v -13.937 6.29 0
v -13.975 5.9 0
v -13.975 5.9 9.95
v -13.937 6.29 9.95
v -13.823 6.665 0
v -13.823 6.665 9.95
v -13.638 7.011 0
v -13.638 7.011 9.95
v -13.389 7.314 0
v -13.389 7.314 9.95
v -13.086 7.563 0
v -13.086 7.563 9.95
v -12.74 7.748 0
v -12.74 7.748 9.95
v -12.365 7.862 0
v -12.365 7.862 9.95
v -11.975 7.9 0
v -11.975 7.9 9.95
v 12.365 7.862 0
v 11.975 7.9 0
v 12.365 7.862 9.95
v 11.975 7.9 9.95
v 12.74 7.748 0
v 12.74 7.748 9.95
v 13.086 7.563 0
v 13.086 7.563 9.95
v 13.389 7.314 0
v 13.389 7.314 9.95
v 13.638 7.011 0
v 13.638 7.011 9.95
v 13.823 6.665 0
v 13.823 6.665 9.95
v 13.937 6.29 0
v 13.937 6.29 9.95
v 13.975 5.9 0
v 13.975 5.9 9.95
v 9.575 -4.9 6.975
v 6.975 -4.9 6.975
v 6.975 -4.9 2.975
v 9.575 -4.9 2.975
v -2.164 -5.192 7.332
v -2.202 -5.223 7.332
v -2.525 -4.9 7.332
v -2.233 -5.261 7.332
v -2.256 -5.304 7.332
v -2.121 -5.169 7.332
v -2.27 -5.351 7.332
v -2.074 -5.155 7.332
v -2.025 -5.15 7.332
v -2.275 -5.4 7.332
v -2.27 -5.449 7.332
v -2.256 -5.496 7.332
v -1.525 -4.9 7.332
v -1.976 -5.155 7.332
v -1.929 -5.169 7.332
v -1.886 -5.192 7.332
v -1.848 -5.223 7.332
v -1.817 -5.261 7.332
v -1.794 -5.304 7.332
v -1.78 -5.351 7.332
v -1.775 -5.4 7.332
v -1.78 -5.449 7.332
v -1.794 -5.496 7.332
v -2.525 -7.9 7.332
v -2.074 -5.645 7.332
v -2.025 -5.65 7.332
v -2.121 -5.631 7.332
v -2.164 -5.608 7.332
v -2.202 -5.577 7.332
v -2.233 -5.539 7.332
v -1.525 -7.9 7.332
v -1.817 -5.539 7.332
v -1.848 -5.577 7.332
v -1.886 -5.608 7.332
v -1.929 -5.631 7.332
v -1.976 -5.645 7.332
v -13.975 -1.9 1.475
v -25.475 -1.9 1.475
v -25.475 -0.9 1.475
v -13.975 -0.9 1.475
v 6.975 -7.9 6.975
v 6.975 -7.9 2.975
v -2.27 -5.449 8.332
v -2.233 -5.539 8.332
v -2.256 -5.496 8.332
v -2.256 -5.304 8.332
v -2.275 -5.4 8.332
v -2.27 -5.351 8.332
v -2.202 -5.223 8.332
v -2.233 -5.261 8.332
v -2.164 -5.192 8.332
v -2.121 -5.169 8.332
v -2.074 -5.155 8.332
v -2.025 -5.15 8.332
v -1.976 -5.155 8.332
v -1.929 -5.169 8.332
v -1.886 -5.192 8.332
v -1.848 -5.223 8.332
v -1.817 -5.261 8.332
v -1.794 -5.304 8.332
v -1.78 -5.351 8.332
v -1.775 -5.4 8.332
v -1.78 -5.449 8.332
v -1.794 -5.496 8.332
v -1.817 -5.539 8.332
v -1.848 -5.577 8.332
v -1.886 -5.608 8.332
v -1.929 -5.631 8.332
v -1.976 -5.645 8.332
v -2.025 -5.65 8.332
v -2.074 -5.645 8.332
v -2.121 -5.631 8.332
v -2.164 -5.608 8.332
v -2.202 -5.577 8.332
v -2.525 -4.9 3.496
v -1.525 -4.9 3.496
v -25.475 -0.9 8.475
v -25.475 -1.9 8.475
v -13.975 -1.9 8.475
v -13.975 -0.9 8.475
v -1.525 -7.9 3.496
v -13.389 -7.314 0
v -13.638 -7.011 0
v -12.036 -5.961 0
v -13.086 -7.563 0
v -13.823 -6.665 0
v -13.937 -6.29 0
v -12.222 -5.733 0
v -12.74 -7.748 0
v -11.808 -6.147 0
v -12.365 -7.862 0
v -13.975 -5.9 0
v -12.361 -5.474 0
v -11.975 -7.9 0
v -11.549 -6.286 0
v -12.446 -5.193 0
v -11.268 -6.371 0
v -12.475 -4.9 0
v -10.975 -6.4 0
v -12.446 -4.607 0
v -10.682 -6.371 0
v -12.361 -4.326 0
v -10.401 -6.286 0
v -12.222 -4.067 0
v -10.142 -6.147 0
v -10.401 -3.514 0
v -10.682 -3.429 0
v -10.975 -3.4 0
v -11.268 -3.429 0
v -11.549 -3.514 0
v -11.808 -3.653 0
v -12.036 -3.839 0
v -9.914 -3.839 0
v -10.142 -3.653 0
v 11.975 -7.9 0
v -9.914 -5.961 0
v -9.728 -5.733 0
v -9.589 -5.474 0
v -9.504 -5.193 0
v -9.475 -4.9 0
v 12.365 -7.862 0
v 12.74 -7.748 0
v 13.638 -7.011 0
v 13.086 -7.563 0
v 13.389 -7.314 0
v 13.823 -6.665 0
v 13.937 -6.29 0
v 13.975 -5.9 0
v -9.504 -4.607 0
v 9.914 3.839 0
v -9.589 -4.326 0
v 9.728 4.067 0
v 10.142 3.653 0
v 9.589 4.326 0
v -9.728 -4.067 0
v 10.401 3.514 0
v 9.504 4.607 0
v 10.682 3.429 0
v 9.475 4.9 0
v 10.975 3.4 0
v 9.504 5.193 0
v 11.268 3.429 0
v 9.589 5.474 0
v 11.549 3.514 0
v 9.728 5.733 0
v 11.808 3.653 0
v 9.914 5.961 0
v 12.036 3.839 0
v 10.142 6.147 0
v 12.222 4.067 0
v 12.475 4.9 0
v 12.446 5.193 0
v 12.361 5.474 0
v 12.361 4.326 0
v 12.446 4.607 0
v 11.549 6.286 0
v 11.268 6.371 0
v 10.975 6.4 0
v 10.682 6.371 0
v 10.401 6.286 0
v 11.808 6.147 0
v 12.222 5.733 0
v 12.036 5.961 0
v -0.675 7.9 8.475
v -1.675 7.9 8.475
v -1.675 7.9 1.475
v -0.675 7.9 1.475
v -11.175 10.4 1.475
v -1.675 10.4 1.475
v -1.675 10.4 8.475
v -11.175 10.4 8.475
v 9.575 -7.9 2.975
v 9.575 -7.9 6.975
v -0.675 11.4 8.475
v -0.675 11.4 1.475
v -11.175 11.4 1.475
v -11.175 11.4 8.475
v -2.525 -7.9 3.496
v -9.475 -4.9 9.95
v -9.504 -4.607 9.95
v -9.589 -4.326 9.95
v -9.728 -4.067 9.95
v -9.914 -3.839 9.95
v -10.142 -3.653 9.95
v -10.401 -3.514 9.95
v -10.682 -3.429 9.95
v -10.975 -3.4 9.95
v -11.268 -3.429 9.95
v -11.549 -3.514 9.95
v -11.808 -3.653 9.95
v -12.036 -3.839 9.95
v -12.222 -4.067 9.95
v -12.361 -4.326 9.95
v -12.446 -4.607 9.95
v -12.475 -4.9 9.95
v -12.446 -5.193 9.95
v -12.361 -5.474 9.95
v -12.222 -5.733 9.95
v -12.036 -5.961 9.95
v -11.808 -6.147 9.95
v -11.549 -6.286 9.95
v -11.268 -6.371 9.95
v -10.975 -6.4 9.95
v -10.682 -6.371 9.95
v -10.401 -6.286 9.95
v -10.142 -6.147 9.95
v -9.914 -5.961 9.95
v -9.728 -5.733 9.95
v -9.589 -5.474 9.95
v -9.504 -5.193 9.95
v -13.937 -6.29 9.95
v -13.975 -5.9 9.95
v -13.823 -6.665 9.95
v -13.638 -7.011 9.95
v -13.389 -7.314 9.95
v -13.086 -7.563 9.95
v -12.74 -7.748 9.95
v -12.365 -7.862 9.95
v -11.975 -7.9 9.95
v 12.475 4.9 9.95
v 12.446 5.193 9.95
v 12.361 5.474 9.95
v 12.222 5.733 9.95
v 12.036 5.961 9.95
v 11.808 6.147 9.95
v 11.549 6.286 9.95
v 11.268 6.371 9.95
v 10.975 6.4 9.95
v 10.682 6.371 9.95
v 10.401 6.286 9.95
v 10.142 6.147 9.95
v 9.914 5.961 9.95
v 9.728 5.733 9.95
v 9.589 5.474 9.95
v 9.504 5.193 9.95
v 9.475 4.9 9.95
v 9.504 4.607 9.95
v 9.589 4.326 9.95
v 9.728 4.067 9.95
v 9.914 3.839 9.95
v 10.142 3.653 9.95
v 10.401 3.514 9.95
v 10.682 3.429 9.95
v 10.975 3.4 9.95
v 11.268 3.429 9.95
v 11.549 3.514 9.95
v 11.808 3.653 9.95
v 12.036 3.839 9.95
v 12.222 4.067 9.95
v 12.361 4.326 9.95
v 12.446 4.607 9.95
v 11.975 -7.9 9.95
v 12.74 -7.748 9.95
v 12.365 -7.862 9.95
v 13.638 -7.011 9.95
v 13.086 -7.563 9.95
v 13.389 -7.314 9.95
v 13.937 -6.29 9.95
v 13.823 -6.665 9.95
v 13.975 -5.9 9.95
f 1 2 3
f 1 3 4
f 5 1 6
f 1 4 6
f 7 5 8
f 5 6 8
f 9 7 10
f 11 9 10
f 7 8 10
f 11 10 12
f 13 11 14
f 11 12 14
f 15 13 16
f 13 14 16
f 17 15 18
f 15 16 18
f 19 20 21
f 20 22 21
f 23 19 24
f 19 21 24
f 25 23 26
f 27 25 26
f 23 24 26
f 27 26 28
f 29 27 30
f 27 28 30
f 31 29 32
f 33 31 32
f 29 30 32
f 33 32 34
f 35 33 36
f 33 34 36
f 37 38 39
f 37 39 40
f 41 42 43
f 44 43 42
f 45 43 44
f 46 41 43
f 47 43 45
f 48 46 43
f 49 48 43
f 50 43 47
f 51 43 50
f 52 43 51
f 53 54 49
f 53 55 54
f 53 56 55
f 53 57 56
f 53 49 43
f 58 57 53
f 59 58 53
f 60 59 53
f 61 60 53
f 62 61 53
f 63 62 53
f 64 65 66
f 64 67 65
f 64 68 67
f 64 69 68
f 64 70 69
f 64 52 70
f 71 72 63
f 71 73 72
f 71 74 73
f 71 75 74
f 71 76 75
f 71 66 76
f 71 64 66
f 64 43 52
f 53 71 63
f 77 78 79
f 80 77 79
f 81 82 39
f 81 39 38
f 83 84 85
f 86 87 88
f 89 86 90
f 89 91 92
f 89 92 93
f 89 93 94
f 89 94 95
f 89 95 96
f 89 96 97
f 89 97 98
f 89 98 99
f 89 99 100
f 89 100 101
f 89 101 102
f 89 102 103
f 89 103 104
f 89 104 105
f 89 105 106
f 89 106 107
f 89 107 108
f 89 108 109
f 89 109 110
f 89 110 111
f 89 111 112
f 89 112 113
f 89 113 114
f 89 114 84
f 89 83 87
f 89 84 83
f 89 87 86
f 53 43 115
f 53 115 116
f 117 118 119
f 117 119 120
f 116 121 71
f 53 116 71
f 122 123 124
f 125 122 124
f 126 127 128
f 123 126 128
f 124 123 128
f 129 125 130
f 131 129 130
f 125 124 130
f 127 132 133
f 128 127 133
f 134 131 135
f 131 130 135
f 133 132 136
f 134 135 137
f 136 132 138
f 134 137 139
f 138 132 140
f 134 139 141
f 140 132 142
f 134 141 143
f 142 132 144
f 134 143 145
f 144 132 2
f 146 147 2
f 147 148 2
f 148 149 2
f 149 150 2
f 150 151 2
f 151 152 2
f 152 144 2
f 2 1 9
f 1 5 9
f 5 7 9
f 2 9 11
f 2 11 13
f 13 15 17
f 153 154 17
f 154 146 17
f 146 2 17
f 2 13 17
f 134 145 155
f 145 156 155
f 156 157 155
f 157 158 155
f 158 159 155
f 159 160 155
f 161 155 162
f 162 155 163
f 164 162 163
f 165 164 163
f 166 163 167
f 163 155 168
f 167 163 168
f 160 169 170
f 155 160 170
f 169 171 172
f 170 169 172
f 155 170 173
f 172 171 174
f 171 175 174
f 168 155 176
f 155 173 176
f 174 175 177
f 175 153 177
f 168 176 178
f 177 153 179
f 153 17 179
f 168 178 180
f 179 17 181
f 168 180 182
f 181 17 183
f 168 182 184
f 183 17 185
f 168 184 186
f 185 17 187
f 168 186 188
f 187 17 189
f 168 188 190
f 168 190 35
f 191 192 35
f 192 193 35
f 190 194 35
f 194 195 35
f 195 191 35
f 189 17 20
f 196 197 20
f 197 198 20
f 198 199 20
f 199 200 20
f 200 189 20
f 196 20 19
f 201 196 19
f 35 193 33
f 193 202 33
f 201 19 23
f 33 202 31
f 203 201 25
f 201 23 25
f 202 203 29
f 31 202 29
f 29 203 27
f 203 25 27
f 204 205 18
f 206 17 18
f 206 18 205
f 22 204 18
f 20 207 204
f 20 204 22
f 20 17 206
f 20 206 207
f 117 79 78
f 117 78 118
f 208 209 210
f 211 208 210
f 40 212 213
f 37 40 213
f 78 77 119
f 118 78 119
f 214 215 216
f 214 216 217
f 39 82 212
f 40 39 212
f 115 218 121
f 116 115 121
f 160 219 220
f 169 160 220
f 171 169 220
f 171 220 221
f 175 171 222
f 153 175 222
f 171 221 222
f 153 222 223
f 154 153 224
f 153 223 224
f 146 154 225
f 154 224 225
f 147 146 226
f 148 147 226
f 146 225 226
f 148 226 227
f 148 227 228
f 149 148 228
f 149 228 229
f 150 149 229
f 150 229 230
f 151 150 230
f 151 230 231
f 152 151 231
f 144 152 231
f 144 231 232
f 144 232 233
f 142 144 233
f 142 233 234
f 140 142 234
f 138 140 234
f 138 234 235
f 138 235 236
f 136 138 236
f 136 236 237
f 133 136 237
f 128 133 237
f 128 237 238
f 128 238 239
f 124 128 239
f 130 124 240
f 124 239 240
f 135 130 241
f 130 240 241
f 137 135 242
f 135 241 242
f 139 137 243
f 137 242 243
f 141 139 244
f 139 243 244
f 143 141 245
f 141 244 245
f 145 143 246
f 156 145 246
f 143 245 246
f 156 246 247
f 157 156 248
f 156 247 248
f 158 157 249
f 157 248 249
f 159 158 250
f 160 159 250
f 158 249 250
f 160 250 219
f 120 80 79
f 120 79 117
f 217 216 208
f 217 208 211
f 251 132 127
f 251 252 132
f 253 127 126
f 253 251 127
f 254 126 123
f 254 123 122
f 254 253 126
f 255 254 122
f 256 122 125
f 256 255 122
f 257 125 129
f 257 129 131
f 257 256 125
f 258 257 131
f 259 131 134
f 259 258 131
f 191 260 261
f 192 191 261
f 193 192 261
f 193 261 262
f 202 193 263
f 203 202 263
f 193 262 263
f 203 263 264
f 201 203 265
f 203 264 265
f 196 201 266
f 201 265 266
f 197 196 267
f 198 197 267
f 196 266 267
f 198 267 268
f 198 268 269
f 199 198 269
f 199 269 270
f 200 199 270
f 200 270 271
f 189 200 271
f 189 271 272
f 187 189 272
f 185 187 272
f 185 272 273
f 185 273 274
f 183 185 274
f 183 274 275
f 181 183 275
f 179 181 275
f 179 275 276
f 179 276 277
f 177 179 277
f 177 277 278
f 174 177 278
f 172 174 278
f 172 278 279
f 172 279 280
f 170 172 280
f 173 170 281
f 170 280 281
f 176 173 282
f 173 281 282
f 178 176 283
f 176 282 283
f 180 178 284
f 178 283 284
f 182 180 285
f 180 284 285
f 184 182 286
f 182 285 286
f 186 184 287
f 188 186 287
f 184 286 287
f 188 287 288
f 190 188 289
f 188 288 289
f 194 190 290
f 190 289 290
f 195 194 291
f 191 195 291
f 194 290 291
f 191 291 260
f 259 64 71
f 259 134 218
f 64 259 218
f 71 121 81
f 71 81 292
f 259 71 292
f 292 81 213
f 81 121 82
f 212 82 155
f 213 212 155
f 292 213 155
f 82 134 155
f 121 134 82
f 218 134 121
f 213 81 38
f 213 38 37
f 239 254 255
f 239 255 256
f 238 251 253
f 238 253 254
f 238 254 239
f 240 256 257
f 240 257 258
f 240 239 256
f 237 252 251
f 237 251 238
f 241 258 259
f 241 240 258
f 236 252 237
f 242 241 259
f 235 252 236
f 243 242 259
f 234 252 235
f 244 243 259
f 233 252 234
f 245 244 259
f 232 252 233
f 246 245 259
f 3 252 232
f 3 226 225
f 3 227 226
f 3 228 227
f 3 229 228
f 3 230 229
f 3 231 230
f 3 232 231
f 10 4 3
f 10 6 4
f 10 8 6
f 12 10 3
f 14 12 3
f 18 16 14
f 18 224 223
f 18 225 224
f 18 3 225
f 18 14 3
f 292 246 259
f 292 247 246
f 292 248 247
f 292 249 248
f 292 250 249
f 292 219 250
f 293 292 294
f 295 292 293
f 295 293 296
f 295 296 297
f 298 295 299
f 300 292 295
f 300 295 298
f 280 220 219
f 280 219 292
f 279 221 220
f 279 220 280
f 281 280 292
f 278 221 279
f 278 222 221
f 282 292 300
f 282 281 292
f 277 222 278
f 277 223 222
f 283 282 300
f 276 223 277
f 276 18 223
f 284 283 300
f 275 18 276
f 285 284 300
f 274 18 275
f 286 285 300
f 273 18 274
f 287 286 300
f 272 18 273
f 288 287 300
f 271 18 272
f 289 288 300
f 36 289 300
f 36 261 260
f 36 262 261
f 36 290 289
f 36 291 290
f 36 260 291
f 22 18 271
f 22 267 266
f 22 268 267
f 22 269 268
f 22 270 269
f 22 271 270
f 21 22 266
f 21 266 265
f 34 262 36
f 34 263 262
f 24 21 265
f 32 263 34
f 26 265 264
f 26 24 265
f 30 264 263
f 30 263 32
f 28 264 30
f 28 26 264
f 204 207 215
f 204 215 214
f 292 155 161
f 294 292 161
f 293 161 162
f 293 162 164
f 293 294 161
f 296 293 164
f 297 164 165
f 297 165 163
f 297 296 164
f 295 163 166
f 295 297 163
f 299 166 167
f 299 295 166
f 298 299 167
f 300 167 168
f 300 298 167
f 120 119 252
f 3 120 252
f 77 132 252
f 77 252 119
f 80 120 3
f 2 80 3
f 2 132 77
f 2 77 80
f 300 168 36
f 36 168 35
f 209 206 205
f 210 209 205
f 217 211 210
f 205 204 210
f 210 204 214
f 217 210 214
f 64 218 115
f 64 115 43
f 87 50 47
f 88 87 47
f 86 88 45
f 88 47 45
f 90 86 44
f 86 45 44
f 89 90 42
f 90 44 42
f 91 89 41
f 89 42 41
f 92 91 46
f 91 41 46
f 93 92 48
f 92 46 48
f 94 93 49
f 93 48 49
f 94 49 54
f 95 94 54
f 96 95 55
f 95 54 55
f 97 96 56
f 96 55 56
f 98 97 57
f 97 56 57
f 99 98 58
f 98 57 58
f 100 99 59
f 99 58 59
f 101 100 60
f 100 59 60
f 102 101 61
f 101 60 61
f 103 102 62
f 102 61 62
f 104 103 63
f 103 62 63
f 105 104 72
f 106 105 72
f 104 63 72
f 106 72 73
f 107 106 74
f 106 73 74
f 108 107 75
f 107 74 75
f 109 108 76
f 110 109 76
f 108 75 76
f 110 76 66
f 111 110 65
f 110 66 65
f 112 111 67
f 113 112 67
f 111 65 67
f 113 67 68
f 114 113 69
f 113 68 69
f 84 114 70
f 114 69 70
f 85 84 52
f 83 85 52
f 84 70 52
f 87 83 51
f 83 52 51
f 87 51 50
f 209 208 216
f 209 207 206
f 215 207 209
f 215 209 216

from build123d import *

# Parameters (mm, degrees)
SKETCH1_W      = 27.95
SKETCH1_H      = 15.8
EXTRUDE1_DEPTH = 9.95
SKETCH2_R      = 1.5
EXTRUDE2_DEPTH = 10.95
FILLET1_R      = 2
SKETCH3_W      = 7
SKETCH3_H      = 1
EXTRUDE3_DEPTH = 11.5
SKETCH4_W      = 1
SKETCH4_H      = 7
EXTRUDE4_DEPTH = 3.5
SKETCH5_W      = 7
SKETCH5_H      = 1
EXTRUDE5_DEPTH = 9.5
SKETCH6_W      = 2.6
SKETCH6_H      = 4
EXTRUDE6_DEPTH = 3
SKETCH7_W      = 1
SKETCH7_H      = 3.836260464
EXTRUDE7_DEPTH = 3
SKETCH8_R      = 0.25
EXTRUDE8_DEPTH = 1


with BuildPart() as part:
    # Sketch1 → Extrude1 (new body)
    with BuildSketch(Plane.XY):
        Rectangle(SKETCH1_W, SKETCH1_H)
    extrude(amount=EXTRUDE1_DEPTH)

    # Sketch2 → Extrude2 (cut, through all)
    with BuildSketch(Plane.XY.offset(9.95)):
        with Locations((10.975, 4.9)):
            Circle(SKETCH2_R)
        with Locations((-10.975, -4.9)):
            Circle(SKETCH2_R)
    extrude(amount=-EXTRUDE2_DEPTH, mode=Mode.SUBTRACT)

    # Fillet1
    fillet1_edges = [part.edges().sort_by_distance(p)[0] for p in [
        (-13.975, 7.9, 4.975),
        (13.975, 7.9, 4.975),
        (13.975, -7.9, 4.975),
        (-13.975, -7.9, 4.975),
    ]]
    fillet(fillet1_edges, radius=FILLET1_R)

    # Sketch3 → Extrude3 (add)
    with BuildSketch(Plane.ZY.offset(13.975)):
        with Locations((4.975, -1.4)):
            Rectangle(SKETCH3_W, SKETCH3_H)
    extrude(amount=EXTRUDE3_DEPTH)

    # Sketch4 → Extrude4 (add)
    with BuildSketch(Plane(origin=(0, 7.9, 0), x_dir=(-1, 0, 0), z_dir=(0, 1, 0))):
        with Locations((1.175, 4.975)):
            Rectangle(SKETCH4_W, SKETCH4_H)
    extrude(amount=EXTRUDE4_DEPTH)

    # Sketch5 → Extrude5 (add)
    with BuildSketch(Plane.ZY.offset(1.675)):
        with Locations((4.975, 10.9)):
            Rectangle(SKETCH5_W, SKETCH5_H)
    extrude(amount=EXTRUDE5_DEPTH)

    # Sketch6 → Extrude6 (cut)
    with BuildSketch(Plane.XZ.offset(7.9)):
        with Locations((8.275, 4.975)):
            Rectangle(SKETCH6_W, SKETCH6_H)
    extrude(amount=-EXTRUDE6_DEPTH, mode=Mode.SUBTRACT)

    # Sketch7 → Extrude7 (cut)
    with BuildSketch(Plane.XZ.offset(7.9)):
        with Locations((-2.025, 5.414128699)):
            Rectangle(SKETCH7_W, SKETCH7_H)
    extrude(amount=-EXTRUDE7_DEPTH, mode=Mode.SUBTRACT)

    # Sketch8 → Extrude8 (cut)
    with BuildSketch(Plane(origin=(0, 0, 7.332258931), x_dir=(-1, 0, 0), z_dir=(0, 0, -1))):
        with Locations((2.025, -5.4)):
            Circle(SKETCH8_R)
    extrude(amount=-EXTRUDE8_DEPTH, mode=Mode.SUBTRACT)


solid = part.part
